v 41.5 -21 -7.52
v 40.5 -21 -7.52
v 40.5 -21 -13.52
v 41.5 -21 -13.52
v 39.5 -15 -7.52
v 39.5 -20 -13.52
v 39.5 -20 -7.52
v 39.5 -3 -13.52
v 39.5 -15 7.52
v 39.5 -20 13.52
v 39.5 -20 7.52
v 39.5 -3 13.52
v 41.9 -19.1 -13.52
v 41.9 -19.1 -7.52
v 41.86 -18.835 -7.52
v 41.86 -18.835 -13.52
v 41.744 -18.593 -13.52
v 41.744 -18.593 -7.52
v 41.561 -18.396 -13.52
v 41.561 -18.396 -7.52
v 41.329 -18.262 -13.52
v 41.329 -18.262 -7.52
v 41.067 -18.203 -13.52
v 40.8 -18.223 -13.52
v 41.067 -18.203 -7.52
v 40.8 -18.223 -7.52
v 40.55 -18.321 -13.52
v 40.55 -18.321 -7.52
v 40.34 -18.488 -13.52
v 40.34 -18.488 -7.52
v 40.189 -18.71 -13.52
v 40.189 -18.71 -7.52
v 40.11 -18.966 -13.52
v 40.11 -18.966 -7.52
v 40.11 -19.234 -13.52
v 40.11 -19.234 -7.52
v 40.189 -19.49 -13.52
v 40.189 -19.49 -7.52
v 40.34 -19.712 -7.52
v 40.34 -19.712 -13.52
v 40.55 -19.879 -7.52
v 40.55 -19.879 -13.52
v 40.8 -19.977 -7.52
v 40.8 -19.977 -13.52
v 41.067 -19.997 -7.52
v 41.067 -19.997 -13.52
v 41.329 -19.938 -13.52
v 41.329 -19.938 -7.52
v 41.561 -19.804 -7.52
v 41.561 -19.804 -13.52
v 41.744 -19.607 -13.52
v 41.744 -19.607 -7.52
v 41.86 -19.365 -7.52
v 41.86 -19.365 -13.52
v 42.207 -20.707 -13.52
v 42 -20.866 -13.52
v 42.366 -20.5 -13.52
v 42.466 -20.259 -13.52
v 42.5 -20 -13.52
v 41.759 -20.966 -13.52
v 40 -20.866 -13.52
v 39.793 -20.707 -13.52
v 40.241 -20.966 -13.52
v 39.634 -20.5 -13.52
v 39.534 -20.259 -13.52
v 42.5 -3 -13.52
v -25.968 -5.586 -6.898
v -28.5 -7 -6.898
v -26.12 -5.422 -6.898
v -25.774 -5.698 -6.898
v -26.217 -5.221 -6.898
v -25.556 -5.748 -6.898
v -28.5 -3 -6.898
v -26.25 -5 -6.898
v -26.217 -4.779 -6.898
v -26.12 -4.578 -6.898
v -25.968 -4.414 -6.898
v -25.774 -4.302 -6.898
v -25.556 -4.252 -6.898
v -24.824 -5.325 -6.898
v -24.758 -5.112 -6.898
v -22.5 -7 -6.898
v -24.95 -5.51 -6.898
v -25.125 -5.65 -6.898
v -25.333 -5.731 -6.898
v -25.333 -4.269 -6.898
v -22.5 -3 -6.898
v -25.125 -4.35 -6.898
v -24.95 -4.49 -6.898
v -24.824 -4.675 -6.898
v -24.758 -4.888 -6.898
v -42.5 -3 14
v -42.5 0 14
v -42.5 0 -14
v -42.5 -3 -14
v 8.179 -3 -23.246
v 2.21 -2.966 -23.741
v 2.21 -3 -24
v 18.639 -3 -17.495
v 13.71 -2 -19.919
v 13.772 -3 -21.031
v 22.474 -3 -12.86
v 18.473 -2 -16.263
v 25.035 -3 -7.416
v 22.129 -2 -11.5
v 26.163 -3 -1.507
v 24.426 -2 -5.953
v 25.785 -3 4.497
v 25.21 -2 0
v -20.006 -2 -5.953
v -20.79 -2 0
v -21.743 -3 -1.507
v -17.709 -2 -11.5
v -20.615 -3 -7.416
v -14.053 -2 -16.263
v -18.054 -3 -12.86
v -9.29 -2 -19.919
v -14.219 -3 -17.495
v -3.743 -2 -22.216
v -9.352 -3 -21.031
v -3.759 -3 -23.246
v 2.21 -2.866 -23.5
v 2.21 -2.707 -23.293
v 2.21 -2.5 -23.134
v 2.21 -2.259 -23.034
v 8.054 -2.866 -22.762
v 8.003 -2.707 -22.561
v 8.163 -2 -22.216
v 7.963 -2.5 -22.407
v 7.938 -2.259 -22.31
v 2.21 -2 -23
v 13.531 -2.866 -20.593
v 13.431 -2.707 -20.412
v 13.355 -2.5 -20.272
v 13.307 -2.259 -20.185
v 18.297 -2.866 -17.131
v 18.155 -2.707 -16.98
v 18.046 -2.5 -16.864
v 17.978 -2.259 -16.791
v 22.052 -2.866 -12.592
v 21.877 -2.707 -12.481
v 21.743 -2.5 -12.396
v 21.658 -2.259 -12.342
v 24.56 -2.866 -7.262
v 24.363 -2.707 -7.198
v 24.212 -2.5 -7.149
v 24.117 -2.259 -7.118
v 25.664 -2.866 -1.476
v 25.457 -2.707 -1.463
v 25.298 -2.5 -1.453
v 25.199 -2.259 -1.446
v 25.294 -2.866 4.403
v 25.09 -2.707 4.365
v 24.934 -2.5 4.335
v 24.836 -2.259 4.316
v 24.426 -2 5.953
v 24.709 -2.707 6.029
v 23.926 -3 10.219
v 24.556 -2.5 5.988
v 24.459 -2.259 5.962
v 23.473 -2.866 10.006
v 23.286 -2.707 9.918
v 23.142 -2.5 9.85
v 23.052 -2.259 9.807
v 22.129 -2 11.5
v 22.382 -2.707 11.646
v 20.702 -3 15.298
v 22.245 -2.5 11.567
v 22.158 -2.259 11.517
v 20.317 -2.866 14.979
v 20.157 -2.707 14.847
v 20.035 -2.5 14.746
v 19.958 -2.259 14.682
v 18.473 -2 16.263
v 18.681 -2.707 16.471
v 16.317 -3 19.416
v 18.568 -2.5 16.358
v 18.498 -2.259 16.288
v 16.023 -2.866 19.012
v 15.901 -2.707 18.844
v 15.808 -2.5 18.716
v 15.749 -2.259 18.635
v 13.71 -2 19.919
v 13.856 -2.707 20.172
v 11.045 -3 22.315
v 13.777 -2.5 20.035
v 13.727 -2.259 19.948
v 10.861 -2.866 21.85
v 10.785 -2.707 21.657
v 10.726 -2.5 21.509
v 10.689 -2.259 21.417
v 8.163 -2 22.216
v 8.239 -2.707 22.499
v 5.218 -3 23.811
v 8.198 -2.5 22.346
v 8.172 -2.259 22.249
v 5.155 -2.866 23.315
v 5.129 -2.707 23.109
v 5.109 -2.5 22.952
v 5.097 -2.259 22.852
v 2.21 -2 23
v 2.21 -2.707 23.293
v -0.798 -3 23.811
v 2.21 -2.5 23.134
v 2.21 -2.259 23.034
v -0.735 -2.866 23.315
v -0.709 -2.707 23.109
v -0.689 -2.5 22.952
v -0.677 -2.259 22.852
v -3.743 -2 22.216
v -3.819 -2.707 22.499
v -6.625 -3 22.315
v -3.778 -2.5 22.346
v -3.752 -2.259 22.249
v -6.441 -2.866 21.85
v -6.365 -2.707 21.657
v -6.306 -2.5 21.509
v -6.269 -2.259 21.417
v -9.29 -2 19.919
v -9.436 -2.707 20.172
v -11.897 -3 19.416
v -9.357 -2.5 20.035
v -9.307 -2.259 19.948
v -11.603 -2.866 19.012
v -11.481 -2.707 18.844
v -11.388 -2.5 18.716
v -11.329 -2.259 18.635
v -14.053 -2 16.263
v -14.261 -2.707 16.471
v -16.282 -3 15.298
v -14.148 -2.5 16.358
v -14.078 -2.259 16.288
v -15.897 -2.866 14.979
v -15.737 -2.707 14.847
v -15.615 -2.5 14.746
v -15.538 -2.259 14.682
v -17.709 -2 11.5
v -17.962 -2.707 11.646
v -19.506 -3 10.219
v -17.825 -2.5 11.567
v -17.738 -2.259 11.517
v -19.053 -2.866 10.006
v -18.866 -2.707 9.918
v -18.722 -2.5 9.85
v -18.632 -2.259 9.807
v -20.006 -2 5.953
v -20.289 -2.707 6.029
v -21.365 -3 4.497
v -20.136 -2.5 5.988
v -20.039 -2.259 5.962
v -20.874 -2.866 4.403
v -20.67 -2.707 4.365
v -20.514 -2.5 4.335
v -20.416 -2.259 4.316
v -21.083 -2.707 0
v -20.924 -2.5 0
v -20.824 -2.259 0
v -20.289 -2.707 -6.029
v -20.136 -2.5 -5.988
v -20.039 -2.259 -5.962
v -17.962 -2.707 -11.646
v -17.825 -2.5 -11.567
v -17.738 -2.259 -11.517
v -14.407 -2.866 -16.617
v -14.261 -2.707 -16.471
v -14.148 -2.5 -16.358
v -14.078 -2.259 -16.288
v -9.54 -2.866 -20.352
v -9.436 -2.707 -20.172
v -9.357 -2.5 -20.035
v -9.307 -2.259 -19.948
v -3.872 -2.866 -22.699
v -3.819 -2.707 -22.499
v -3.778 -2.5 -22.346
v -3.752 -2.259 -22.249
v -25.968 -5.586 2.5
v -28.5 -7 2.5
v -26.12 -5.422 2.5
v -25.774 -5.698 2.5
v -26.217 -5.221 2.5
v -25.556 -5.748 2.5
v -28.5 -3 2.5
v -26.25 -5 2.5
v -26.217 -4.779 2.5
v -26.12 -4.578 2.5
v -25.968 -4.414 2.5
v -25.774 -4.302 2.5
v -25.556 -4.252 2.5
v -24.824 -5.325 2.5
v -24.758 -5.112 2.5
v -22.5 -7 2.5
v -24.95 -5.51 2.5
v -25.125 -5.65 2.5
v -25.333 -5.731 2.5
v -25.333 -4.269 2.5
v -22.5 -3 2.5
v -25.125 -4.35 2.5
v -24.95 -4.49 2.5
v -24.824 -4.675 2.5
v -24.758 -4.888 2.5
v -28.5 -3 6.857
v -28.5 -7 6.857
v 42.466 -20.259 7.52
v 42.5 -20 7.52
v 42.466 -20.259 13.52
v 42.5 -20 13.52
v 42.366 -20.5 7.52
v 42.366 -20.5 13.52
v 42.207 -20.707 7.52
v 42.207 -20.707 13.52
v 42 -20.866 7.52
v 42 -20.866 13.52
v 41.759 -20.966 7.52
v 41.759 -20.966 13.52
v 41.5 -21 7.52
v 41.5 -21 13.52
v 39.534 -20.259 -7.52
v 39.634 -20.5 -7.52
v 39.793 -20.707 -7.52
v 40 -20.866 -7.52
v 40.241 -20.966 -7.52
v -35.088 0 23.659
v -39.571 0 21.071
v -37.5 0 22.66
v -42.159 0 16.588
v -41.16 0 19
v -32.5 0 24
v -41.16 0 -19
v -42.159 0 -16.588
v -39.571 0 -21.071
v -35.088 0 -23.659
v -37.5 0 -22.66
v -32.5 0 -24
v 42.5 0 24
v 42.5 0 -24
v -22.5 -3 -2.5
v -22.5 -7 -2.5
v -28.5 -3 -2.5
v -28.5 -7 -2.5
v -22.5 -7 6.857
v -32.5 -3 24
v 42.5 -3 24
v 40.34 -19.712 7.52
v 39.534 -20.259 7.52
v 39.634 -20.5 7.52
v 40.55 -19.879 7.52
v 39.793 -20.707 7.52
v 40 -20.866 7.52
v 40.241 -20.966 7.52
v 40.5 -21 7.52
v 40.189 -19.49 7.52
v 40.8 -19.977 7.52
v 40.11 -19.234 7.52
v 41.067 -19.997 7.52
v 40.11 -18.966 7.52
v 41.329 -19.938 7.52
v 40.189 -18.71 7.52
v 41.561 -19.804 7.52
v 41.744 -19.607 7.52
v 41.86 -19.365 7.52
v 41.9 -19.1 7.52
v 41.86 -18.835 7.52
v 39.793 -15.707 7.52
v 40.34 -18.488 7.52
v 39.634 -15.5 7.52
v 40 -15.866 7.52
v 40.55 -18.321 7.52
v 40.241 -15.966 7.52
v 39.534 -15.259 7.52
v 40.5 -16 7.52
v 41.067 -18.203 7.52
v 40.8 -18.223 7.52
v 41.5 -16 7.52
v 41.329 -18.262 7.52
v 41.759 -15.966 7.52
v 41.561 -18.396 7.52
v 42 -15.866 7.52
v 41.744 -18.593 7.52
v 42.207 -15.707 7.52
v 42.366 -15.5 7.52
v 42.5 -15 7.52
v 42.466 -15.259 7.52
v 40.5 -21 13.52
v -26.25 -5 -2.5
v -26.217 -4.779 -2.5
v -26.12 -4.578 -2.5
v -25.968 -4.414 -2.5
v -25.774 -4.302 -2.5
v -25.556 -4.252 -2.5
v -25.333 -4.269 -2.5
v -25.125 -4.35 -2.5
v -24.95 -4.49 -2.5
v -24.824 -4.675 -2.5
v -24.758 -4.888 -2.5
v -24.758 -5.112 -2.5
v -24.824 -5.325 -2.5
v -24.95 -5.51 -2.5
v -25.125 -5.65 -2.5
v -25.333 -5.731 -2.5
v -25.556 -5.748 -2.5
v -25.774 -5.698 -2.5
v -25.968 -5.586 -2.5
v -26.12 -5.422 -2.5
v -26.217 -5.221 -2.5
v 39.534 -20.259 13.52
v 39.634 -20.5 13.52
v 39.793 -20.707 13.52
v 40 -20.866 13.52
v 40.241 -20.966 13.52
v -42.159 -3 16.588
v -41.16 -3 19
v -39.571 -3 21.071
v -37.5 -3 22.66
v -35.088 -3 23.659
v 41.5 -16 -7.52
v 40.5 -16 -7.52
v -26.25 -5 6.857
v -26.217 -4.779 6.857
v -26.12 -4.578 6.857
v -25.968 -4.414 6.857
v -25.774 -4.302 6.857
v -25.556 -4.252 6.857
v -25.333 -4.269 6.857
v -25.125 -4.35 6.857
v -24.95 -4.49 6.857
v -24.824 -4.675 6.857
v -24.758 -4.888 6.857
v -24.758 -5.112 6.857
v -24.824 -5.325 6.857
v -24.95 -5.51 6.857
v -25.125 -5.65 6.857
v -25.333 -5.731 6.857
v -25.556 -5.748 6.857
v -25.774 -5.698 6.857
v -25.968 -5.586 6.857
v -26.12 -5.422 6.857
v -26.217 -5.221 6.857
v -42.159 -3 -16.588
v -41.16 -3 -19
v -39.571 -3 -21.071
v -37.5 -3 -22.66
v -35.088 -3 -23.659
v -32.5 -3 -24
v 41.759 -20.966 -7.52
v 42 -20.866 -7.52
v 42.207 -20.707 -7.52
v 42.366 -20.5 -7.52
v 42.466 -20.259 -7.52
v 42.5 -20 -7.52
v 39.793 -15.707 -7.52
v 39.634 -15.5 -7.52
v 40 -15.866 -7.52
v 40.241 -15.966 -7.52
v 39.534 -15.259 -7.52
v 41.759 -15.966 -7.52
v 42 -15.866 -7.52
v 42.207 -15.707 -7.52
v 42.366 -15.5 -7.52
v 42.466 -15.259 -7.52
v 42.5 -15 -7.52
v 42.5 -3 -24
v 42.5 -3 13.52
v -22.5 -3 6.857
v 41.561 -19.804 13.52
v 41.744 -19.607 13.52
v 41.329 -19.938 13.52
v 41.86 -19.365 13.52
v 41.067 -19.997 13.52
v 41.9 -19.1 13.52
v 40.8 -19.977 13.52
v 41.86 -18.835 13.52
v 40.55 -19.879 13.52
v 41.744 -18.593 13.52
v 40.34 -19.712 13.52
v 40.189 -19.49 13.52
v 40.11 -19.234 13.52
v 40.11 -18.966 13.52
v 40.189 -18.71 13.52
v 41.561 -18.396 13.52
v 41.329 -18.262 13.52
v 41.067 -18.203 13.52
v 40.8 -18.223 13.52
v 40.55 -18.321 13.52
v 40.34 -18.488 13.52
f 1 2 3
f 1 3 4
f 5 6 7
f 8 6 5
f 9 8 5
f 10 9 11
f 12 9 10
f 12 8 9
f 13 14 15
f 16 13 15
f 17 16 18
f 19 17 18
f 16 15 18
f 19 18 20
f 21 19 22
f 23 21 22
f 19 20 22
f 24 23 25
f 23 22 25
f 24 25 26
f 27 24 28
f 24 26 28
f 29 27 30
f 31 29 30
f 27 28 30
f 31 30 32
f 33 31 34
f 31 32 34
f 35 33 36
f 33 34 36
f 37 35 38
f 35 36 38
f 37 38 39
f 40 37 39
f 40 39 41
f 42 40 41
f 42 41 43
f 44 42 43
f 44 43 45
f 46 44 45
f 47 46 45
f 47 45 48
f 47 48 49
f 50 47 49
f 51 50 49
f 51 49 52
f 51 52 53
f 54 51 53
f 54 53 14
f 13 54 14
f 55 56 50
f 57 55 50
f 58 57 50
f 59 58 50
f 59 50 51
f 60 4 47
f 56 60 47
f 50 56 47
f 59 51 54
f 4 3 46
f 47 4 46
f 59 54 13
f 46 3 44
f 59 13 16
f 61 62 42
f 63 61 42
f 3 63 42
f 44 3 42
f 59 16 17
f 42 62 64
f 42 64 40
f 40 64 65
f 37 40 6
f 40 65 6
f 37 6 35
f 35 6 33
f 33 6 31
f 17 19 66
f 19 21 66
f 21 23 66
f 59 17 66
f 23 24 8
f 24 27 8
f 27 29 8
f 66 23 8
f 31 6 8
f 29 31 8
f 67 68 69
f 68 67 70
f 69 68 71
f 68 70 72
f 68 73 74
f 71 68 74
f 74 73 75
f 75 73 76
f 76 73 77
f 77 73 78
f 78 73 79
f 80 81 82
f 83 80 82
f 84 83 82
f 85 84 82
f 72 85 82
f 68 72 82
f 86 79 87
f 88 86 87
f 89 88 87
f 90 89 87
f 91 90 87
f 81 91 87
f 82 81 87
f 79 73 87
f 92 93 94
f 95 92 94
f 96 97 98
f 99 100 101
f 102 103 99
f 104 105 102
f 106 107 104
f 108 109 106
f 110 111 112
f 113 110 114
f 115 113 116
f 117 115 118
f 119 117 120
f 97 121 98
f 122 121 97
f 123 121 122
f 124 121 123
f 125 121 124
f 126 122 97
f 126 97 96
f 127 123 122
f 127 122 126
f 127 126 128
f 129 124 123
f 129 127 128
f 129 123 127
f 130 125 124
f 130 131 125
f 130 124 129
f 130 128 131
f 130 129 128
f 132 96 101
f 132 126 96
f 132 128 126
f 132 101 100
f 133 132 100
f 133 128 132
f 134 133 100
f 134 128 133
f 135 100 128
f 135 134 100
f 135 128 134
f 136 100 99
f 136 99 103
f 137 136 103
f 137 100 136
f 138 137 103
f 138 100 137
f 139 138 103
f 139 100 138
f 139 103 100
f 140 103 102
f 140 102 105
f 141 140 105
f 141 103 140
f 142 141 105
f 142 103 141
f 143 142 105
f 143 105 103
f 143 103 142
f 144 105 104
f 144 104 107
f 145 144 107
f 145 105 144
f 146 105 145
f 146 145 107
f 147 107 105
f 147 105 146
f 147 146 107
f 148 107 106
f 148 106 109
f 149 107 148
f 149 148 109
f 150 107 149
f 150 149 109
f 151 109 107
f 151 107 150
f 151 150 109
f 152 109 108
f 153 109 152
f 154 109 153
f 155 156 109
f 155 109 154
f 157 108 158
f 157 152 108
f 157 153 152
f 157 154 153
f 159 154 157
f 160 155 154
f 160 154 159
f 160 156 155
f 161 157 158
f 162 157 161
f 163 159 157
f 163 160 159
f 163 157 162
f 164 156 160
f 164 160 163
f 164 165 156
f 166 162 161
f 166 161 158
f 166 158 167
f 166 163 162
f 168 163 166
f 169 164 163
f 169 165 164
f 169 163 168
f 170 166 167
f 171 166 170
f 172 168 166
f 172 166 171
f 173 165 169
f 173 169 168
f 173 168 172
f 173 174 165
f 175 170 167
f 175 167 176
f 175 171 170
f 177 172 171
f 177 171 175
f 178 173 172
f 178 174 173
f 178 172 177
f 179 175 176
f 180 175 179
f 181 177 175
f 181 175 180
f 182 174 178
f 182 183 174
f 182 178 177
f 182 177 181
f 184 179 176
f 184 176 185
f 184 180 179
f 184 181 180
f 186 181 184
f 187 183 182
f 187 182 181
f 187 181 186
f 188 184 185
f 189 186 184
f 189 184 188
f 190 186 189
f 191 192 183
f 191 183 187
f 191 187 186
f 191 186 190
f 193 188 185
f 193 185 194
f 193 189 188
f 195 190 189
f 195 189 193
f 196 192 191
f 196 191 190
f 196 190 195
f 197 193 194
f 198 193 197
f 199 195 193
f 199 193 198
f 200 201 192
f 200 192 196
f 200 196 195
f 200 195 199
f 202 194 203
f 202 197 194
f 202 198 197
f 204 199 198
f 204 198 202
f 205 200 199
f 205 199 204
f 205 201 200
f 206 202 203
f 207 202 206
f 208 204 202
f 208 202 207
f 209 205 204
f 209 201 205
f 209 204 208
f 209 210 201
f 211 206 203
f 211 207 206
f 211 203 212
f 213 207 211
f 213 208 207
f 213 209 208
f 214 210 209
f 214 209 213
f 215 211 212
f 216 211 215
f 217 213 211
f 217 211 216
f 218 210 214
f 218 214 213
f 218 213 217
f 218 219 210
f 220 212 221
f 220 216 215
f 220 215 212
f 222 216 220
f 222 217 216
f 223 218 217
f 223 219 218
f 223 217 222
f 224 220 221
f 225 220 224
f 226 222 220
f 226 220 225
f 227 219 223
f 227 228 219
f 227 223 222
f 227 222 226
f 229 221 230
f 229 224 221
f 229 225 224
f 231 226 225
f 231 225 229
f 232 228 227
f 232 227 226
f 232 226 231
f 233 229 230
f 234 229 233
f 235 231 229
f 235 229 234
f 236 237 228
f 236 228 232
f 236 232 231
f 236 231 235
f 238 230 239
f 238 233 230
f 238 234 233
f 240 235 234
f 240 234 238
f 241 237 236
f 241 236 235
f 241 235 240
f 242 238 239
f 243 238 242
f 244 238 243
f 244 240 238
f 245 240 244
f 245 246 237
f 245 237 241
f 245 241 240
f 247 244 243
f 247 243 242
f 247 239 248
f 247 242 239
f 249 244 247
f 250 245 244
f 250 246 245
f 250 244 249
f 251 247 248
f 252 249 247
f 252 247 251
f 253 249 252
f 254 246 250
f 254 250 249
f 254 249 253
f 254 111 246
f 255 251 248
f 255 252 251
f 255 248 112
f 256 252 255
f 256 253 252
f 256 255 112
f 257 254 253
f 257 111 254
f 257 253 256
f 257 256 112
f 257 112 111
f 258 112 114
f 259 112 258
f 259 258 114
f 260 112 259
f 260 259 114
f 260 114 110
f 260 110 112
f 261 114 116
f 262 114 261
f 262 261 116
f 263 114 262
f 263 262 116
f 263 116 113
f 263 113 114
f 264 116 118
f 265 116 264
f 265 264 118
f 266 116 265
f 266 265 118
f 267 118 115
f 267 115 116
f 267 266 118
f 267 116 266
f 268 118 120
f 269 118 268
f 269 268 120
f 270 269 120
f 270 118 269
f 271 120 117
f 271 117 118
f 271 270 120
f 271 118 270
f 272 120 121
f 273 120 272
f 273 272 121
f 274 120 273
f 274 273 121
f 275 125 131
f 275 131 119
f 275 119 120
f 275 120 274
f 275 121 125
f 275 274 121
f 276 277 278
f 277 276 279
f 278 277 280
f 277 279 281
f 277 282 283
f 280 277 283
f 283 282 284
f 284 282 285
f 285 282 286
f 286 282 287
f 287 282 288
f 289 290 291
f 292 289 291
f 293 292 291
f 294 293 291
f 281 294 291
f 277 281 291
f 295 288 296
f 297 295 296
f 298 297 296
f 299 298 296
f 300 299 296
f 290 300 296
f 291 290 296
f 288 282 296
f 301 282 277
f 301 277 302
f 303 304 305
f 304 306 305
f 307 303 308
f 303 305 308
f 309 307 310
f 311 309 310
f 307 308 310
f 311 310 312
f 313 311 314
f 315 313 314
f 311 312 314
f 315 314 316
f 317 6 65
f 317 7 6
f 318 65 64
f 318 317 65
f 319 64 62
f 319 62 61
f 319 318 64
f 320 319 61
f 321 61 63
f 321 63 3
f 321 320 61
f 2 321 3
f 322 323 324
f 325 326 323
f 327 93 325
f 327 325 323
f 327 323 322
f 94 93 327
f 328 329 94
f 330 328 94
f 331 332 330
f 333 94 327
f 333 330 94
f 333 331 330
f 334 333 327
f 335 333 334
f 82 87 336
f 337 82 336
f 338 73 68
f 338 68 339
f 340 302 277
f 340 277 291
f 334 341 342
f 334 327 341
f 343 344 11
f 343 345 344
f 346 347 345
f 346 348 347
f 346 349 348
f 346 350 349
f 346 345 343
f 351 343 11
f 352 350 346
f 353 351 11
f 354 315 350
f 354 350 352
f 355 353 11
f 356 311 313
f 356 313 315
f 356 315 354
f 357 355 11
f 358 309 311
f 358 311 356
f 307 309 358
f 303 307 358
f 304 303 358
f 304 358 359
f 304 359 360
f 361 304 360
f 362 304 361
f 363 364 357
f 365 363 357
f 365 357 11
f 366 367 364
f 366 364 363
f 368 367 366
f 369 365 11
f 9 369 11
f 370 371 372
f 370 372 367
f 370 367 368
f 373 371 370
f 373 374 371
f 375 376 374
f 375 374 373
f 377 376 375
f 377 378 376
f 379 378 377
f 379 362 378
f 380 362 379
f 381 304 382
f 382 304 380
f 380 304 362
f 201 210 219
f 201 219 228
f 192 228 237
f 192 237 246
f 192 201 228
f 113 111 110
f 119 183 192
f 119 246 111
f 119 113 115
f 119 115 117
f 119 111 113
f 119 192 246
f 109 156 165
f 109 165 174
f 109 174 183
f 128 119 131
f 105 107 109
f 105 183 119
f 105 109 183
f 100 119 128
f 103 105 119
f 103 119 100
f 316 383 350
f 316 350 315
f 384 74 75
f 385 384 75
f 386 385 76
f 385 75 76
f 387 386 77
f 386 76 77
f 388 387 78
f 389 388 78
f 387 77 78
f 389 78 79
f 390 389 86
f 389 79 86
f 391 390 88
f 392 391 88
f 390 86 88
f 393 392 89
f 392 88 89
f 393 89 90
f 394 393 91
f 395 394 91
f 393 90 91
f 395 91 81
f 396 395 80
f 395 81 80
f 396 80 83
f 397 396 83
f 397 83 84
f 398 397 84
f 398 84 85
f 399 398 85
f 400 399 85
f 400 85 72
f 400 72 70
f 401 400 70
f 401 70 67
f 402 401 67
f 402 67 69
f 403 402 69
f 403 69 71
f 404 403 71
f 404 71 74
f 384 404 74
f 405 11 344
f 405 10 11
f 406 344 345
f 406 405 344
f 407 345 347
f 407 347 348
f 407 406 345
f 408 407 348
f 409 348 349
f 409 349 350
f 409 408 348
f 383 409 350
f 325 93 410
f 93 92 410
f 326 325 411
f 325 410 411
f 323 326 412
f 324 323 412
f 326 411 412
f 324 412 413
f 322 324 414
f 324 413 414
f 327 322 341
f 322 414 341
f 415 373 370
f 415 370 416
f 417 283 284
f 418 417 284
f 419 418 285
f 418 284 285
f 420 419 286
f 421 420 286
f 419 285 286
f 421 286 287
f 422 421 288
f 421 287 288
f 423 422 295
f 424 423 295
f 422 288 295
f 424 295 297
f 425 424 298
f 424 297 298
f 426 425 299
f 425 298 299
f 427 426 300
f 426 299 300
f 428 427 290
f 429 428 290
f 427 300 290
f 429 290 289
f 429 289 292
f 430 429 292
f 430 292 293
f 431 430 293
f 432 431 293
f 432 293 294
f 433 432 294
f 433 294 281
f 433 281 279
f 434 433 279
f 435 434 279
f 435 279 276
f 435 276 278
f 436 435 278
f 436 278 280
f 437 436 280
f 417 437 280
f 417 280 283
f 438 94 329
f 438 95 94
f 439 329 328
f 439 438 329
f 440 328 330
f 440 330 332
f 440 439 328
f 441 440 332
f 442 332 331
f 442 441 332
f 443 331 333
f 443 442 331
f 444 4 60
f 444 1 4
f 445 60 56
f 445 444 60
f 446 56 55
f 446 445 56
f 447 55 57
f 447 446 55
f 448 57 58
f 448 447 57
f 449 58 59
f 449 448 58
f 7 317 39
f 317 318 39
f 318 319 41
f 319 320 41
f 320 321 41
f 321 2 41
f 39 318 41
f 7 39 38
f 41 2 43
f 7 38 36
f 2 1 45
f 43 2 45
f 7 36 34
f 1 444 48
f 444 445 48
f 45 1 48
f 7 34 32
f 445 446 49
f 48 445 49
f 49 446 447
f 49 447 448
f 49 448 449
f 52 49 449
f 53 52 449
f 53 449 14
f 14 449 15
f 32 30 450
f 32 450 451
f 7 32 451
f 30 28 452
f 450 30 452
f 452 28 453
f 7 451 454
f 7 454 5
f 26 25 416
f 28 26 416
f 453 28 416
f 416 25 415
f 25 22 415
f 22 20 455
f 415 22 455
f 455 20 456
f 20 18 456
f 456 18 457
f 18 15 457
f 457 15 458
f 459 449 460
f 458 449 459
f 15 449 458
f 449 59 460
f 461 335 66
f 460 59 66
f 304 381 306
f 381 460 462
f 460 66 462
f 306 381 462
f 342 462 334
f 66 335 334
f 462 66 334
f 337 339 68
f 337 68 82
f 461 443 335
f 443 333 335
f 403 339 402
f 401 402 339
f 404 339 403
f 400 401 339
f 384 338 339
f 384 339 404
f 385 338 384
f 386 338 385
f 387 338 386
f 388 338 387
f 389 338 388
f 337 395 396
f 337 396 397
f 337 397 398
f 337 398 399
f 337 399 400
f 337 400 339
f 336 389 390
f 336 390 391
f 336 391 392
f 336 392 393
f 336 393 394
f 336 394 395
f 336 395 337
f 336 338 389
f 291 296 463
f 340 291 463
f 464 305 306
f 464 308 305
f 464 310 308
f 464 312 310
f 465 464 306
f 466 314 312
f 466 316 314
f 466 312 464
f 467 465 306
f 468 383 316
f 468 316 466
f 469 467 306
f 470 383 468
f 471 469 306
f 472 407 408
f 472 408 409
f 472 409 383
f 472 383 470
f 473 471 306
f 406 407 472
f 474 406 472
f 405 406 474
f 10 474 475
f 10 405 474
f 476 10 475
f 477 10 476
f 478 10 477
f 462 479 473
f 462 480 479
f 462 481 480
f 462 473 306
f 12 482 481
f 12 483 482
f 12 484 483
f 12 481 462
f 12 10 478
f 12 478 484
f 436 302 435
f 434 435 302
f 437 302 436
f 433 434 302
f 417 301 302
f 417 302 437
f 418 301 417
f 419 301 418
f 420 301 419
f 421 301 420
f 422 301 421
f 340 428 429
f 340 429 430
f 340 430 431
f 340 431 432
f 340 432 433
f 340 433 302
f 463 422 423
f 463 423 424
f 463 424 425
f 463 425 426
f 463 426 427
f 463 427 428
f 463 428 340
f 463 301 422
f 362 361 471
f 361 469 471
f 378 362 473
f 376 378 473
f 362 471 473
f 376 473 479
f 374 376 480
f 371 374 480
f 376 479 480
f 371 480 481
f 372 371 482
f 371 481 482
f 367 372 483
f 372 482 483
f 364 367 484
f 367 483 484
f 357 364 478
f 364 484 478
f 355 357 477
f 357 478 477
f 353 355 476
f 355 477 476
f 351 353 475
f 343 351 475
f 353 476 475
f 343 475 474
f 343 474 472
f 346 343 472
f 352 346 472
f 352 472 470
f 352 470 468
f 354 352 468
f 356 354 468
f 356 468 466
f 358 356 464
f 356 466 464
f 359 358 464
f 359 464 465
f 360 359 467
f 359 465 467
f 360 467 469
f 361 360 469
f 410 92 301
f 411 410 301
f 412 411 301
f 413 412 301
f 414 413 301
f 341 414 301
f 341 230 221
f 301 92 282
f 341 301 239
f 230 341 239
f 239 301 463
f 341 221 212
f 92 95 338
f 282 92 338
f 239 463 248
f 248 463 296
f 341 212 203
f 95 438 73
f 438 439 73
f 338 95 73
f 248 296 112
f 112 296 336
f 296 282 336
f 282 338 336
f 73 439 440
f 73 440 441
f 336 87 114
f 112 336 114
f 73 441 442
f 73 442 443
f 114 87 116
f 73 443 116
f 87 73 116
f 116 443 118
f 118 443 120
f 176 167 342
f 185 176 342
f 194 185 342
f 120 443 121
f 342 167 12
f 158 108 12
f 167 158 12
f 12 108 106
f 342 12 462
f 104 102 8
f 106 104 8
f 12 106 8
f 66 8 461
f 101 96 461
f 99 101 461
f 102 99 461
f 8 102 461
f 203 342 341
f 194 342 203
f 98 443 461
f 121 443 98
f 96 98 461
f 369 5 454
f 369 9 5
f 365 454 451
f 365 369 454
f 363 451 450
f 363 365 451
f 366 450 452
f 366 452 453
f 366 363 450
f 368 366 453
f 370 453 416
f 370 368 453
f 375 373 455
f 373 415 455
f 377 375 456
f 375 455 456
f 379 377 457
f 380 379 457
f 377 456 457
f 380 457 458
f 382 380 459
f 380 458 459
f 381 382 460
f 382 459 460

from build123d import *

# Parameters (mm, degrees)
SKETCH1_W                  = 85
SKETCH1_H                  = 48
BOSS_EXTRUDE1_DEPTH        = 3
SKETCH2_W                  = 3
SKETCH2_H                  = 48
BOSS_EXTRUDE2_DEPTH        = 18
M1_6_CLEARANCE_HOLE2_D     = 1.8
SKETCH11_W                 = 15.04
SKETCH11_H                 = 5
CUT_EXTRUDE5_DEPTH         = 91.785461391
SKETCH14_W                 = 10.48
SKETCH14_H                 = 18
CUT_EXTRUDE6_DEPTH         = 88.982952894
FILLET1_R                  = 1
FILLET2_R                  = 1
FILLET3_R                  = 1
FILLET4_R                  = 1
FILLET5_R                  = 1
FILLET6_R                  = 1
SKETCH17_R                 = 23
CUT_EXTRUDE11_DEPTH        = 1
FILLET9_R                  = 1
FILLET10_R                 = 10
FILLET11_R                 = 10
SKETCH18_W                 = 6
SKETCH18_H                 = 4.397787755
SKETCH18_H_2               = 4.357175314
BOSS_EXTRUDE3_DEPTH        = 4
F_1_5_1_5_DIAMETER_HOLE1_D = 1.5


with BuildPart() as part:
    # Sketch1 → Boss-Extrude1 (new body)
    with BuildSketch(Plane(origin=(0, 0, 0), x_dir=(1, 0, 0), z_dir=(0, 1, 0))):
        Rectangle(SKETCH1_W, SKETCH1_H)
    extrude(amount=-BOSS_EXTRUDE1_DEPTH)

    # Sketch2 → Boss-Extrude2 (add)
    with BuildSketch(Plane.XZ.offset(3)):
        with Locations((41, 0)):
            Rectangle(SKETCH2_W, SKETCH2_H)
    extrude(amount=BOSS_EXTRUDE2_DEPTH)

    # M1.6 Clearance Hole2 (through all)
    with Locations(Plane(origin=(0, 0, -24), x_dir=(-1, 0, 0), z_dir=(0, 0, -1))):
        with Locations((-41, -19.1)):
            Hole(M1_6_CLEARANCE_HOLE2_D / 2)

    # Sketch11 → Cut-Extrude5 (cut, through all)
    with BuildSketch(Plane(origin=(42.5, 0, 0), x_dir=(0, 0, -1), z_dir=(1, 0, 0))):
        with Locations((0, -18.5)):
            Rectangle(SKETCH11_W, SKETCH11_H)
    extrude(amount=-CUT_EXTRUDE5_DEPTH, mode=Mode.SUBTRACT)

    # Sketch14 → Cut-Extrude6 (cut, through all)
    with BuildSketch(Plane.ZY.offset(-39.5)):
        with Locations((-18.76, -12)):
            Rectangle(SKETCH14_W, SKETCH14_H)
        with Locations((18.76, -12)):
            Rectangle(SKETCH14_W, SKETCH14_H)
    extrude(amount=-CUT_EXTRUDE6_DEPTH, mode=Mode.SUBTRACT)

    # Fillet1
    fillet1_edges = [part.edges().sort_by_distance(p)[0] for p in [
        (42.5, -21, -10.52),
    ]]
    fillet(fillet1_edges, radius=FILLET1_R)

    # Fillet2
    fillet2_edges = [part.edges().sort_by_distance(p)[0] for p in [
        (42.5, -21, 10.52),
    ]]
    fillet(fillet2_edges, radius=FILLET2_R)

    # Fillet3
    fillet3_edges = [part.edges().sort_by_distance(p)[0] for p in [
        (39.5, -21, -10.52),
    ]]
    fillet(fillet3_edges, radius=FILLET3_R)

    # Fillet4
    fillet4_edges = [part.edges().sort_by_distance(p)[0] for p in [
        (39.5, -21, 10.52),
    ]]
    fillet(fillet4_edges, radius=FILLET4_R)

    # Fillet5
    fillet5_edges = [part.edges().sort_by_distance(p)[0] for p in [
        (42.5, -16, 0),
    ]]
    fillet(fillet5_edges, radius=FILLET5_R)

    # Fillet6
    fillet6_edges = [part.edges().sort_by_distance(p)[0] for p in [
        (39.5, -16, 0),
    ]]
    fillet(fillet6_edges, radius=FILLET6_R)

    # Sketch17 → Cut-Extrude11 (cut)
    with BuildSketch(Plane.XZ.offset(3)):
        with Locations(Location((2.21, 0, 0), (0, 0, 270))):
            Circle(SKETCH17_R)
    extrude(amount=-CUT_EXTRUDE11_DEPTH, mode=Mode.SUBTRACT)

    # Fillet9
    fillet9_edges = [part.edges().sort_by_distance(p)[0] for p in [
        (2.21, -3, 23),
    ]]
    fillet(fillet9_edges, radius=FILLET9_R - 0.0001)  # a hair under: the kernel refuses the full size

    # Fillet10
    fillet10_edges = [part.edges().sort_by_distance(p)[0] for p in [
        (-42.5, -1.5, -24),
    ]]
    fillet(fillet10_edges, radius=FILLET10_R)

    # Fillet11
    fillet11_edges = [part.edges().sort_by_distance(p)[0] for p in [
        (-42.5, -1.5, 24),
    ]]
    fillet(fillet11_edges, radius=FILLET11_R)

    # Sketch18 → Boss-Extrude3 (add)
    with BuildSketch(Plane.XZ.offset(3)):
        with Locations((-25.5, -4.698893877)):
            Rectangle(SKETCH18_W, SKETCH18_H)
        with Locations((-25.5, 4.678587657)):
            Rectangle(SKETCH18_W, SKETCH18_H_2)
    extrude(amount=BOSS_EXTRUDE3_DEPTH)

    # Ø1.5 (1.5) Diameter Hole1 (through all)
    with Locations(Plane.XY.offset(6.857175314)):
        with Locations((-25.5, -5)):
            Hole(F_1_5_1_5_DIAMETER_HOLE1_D / 2)


solid = part.part
